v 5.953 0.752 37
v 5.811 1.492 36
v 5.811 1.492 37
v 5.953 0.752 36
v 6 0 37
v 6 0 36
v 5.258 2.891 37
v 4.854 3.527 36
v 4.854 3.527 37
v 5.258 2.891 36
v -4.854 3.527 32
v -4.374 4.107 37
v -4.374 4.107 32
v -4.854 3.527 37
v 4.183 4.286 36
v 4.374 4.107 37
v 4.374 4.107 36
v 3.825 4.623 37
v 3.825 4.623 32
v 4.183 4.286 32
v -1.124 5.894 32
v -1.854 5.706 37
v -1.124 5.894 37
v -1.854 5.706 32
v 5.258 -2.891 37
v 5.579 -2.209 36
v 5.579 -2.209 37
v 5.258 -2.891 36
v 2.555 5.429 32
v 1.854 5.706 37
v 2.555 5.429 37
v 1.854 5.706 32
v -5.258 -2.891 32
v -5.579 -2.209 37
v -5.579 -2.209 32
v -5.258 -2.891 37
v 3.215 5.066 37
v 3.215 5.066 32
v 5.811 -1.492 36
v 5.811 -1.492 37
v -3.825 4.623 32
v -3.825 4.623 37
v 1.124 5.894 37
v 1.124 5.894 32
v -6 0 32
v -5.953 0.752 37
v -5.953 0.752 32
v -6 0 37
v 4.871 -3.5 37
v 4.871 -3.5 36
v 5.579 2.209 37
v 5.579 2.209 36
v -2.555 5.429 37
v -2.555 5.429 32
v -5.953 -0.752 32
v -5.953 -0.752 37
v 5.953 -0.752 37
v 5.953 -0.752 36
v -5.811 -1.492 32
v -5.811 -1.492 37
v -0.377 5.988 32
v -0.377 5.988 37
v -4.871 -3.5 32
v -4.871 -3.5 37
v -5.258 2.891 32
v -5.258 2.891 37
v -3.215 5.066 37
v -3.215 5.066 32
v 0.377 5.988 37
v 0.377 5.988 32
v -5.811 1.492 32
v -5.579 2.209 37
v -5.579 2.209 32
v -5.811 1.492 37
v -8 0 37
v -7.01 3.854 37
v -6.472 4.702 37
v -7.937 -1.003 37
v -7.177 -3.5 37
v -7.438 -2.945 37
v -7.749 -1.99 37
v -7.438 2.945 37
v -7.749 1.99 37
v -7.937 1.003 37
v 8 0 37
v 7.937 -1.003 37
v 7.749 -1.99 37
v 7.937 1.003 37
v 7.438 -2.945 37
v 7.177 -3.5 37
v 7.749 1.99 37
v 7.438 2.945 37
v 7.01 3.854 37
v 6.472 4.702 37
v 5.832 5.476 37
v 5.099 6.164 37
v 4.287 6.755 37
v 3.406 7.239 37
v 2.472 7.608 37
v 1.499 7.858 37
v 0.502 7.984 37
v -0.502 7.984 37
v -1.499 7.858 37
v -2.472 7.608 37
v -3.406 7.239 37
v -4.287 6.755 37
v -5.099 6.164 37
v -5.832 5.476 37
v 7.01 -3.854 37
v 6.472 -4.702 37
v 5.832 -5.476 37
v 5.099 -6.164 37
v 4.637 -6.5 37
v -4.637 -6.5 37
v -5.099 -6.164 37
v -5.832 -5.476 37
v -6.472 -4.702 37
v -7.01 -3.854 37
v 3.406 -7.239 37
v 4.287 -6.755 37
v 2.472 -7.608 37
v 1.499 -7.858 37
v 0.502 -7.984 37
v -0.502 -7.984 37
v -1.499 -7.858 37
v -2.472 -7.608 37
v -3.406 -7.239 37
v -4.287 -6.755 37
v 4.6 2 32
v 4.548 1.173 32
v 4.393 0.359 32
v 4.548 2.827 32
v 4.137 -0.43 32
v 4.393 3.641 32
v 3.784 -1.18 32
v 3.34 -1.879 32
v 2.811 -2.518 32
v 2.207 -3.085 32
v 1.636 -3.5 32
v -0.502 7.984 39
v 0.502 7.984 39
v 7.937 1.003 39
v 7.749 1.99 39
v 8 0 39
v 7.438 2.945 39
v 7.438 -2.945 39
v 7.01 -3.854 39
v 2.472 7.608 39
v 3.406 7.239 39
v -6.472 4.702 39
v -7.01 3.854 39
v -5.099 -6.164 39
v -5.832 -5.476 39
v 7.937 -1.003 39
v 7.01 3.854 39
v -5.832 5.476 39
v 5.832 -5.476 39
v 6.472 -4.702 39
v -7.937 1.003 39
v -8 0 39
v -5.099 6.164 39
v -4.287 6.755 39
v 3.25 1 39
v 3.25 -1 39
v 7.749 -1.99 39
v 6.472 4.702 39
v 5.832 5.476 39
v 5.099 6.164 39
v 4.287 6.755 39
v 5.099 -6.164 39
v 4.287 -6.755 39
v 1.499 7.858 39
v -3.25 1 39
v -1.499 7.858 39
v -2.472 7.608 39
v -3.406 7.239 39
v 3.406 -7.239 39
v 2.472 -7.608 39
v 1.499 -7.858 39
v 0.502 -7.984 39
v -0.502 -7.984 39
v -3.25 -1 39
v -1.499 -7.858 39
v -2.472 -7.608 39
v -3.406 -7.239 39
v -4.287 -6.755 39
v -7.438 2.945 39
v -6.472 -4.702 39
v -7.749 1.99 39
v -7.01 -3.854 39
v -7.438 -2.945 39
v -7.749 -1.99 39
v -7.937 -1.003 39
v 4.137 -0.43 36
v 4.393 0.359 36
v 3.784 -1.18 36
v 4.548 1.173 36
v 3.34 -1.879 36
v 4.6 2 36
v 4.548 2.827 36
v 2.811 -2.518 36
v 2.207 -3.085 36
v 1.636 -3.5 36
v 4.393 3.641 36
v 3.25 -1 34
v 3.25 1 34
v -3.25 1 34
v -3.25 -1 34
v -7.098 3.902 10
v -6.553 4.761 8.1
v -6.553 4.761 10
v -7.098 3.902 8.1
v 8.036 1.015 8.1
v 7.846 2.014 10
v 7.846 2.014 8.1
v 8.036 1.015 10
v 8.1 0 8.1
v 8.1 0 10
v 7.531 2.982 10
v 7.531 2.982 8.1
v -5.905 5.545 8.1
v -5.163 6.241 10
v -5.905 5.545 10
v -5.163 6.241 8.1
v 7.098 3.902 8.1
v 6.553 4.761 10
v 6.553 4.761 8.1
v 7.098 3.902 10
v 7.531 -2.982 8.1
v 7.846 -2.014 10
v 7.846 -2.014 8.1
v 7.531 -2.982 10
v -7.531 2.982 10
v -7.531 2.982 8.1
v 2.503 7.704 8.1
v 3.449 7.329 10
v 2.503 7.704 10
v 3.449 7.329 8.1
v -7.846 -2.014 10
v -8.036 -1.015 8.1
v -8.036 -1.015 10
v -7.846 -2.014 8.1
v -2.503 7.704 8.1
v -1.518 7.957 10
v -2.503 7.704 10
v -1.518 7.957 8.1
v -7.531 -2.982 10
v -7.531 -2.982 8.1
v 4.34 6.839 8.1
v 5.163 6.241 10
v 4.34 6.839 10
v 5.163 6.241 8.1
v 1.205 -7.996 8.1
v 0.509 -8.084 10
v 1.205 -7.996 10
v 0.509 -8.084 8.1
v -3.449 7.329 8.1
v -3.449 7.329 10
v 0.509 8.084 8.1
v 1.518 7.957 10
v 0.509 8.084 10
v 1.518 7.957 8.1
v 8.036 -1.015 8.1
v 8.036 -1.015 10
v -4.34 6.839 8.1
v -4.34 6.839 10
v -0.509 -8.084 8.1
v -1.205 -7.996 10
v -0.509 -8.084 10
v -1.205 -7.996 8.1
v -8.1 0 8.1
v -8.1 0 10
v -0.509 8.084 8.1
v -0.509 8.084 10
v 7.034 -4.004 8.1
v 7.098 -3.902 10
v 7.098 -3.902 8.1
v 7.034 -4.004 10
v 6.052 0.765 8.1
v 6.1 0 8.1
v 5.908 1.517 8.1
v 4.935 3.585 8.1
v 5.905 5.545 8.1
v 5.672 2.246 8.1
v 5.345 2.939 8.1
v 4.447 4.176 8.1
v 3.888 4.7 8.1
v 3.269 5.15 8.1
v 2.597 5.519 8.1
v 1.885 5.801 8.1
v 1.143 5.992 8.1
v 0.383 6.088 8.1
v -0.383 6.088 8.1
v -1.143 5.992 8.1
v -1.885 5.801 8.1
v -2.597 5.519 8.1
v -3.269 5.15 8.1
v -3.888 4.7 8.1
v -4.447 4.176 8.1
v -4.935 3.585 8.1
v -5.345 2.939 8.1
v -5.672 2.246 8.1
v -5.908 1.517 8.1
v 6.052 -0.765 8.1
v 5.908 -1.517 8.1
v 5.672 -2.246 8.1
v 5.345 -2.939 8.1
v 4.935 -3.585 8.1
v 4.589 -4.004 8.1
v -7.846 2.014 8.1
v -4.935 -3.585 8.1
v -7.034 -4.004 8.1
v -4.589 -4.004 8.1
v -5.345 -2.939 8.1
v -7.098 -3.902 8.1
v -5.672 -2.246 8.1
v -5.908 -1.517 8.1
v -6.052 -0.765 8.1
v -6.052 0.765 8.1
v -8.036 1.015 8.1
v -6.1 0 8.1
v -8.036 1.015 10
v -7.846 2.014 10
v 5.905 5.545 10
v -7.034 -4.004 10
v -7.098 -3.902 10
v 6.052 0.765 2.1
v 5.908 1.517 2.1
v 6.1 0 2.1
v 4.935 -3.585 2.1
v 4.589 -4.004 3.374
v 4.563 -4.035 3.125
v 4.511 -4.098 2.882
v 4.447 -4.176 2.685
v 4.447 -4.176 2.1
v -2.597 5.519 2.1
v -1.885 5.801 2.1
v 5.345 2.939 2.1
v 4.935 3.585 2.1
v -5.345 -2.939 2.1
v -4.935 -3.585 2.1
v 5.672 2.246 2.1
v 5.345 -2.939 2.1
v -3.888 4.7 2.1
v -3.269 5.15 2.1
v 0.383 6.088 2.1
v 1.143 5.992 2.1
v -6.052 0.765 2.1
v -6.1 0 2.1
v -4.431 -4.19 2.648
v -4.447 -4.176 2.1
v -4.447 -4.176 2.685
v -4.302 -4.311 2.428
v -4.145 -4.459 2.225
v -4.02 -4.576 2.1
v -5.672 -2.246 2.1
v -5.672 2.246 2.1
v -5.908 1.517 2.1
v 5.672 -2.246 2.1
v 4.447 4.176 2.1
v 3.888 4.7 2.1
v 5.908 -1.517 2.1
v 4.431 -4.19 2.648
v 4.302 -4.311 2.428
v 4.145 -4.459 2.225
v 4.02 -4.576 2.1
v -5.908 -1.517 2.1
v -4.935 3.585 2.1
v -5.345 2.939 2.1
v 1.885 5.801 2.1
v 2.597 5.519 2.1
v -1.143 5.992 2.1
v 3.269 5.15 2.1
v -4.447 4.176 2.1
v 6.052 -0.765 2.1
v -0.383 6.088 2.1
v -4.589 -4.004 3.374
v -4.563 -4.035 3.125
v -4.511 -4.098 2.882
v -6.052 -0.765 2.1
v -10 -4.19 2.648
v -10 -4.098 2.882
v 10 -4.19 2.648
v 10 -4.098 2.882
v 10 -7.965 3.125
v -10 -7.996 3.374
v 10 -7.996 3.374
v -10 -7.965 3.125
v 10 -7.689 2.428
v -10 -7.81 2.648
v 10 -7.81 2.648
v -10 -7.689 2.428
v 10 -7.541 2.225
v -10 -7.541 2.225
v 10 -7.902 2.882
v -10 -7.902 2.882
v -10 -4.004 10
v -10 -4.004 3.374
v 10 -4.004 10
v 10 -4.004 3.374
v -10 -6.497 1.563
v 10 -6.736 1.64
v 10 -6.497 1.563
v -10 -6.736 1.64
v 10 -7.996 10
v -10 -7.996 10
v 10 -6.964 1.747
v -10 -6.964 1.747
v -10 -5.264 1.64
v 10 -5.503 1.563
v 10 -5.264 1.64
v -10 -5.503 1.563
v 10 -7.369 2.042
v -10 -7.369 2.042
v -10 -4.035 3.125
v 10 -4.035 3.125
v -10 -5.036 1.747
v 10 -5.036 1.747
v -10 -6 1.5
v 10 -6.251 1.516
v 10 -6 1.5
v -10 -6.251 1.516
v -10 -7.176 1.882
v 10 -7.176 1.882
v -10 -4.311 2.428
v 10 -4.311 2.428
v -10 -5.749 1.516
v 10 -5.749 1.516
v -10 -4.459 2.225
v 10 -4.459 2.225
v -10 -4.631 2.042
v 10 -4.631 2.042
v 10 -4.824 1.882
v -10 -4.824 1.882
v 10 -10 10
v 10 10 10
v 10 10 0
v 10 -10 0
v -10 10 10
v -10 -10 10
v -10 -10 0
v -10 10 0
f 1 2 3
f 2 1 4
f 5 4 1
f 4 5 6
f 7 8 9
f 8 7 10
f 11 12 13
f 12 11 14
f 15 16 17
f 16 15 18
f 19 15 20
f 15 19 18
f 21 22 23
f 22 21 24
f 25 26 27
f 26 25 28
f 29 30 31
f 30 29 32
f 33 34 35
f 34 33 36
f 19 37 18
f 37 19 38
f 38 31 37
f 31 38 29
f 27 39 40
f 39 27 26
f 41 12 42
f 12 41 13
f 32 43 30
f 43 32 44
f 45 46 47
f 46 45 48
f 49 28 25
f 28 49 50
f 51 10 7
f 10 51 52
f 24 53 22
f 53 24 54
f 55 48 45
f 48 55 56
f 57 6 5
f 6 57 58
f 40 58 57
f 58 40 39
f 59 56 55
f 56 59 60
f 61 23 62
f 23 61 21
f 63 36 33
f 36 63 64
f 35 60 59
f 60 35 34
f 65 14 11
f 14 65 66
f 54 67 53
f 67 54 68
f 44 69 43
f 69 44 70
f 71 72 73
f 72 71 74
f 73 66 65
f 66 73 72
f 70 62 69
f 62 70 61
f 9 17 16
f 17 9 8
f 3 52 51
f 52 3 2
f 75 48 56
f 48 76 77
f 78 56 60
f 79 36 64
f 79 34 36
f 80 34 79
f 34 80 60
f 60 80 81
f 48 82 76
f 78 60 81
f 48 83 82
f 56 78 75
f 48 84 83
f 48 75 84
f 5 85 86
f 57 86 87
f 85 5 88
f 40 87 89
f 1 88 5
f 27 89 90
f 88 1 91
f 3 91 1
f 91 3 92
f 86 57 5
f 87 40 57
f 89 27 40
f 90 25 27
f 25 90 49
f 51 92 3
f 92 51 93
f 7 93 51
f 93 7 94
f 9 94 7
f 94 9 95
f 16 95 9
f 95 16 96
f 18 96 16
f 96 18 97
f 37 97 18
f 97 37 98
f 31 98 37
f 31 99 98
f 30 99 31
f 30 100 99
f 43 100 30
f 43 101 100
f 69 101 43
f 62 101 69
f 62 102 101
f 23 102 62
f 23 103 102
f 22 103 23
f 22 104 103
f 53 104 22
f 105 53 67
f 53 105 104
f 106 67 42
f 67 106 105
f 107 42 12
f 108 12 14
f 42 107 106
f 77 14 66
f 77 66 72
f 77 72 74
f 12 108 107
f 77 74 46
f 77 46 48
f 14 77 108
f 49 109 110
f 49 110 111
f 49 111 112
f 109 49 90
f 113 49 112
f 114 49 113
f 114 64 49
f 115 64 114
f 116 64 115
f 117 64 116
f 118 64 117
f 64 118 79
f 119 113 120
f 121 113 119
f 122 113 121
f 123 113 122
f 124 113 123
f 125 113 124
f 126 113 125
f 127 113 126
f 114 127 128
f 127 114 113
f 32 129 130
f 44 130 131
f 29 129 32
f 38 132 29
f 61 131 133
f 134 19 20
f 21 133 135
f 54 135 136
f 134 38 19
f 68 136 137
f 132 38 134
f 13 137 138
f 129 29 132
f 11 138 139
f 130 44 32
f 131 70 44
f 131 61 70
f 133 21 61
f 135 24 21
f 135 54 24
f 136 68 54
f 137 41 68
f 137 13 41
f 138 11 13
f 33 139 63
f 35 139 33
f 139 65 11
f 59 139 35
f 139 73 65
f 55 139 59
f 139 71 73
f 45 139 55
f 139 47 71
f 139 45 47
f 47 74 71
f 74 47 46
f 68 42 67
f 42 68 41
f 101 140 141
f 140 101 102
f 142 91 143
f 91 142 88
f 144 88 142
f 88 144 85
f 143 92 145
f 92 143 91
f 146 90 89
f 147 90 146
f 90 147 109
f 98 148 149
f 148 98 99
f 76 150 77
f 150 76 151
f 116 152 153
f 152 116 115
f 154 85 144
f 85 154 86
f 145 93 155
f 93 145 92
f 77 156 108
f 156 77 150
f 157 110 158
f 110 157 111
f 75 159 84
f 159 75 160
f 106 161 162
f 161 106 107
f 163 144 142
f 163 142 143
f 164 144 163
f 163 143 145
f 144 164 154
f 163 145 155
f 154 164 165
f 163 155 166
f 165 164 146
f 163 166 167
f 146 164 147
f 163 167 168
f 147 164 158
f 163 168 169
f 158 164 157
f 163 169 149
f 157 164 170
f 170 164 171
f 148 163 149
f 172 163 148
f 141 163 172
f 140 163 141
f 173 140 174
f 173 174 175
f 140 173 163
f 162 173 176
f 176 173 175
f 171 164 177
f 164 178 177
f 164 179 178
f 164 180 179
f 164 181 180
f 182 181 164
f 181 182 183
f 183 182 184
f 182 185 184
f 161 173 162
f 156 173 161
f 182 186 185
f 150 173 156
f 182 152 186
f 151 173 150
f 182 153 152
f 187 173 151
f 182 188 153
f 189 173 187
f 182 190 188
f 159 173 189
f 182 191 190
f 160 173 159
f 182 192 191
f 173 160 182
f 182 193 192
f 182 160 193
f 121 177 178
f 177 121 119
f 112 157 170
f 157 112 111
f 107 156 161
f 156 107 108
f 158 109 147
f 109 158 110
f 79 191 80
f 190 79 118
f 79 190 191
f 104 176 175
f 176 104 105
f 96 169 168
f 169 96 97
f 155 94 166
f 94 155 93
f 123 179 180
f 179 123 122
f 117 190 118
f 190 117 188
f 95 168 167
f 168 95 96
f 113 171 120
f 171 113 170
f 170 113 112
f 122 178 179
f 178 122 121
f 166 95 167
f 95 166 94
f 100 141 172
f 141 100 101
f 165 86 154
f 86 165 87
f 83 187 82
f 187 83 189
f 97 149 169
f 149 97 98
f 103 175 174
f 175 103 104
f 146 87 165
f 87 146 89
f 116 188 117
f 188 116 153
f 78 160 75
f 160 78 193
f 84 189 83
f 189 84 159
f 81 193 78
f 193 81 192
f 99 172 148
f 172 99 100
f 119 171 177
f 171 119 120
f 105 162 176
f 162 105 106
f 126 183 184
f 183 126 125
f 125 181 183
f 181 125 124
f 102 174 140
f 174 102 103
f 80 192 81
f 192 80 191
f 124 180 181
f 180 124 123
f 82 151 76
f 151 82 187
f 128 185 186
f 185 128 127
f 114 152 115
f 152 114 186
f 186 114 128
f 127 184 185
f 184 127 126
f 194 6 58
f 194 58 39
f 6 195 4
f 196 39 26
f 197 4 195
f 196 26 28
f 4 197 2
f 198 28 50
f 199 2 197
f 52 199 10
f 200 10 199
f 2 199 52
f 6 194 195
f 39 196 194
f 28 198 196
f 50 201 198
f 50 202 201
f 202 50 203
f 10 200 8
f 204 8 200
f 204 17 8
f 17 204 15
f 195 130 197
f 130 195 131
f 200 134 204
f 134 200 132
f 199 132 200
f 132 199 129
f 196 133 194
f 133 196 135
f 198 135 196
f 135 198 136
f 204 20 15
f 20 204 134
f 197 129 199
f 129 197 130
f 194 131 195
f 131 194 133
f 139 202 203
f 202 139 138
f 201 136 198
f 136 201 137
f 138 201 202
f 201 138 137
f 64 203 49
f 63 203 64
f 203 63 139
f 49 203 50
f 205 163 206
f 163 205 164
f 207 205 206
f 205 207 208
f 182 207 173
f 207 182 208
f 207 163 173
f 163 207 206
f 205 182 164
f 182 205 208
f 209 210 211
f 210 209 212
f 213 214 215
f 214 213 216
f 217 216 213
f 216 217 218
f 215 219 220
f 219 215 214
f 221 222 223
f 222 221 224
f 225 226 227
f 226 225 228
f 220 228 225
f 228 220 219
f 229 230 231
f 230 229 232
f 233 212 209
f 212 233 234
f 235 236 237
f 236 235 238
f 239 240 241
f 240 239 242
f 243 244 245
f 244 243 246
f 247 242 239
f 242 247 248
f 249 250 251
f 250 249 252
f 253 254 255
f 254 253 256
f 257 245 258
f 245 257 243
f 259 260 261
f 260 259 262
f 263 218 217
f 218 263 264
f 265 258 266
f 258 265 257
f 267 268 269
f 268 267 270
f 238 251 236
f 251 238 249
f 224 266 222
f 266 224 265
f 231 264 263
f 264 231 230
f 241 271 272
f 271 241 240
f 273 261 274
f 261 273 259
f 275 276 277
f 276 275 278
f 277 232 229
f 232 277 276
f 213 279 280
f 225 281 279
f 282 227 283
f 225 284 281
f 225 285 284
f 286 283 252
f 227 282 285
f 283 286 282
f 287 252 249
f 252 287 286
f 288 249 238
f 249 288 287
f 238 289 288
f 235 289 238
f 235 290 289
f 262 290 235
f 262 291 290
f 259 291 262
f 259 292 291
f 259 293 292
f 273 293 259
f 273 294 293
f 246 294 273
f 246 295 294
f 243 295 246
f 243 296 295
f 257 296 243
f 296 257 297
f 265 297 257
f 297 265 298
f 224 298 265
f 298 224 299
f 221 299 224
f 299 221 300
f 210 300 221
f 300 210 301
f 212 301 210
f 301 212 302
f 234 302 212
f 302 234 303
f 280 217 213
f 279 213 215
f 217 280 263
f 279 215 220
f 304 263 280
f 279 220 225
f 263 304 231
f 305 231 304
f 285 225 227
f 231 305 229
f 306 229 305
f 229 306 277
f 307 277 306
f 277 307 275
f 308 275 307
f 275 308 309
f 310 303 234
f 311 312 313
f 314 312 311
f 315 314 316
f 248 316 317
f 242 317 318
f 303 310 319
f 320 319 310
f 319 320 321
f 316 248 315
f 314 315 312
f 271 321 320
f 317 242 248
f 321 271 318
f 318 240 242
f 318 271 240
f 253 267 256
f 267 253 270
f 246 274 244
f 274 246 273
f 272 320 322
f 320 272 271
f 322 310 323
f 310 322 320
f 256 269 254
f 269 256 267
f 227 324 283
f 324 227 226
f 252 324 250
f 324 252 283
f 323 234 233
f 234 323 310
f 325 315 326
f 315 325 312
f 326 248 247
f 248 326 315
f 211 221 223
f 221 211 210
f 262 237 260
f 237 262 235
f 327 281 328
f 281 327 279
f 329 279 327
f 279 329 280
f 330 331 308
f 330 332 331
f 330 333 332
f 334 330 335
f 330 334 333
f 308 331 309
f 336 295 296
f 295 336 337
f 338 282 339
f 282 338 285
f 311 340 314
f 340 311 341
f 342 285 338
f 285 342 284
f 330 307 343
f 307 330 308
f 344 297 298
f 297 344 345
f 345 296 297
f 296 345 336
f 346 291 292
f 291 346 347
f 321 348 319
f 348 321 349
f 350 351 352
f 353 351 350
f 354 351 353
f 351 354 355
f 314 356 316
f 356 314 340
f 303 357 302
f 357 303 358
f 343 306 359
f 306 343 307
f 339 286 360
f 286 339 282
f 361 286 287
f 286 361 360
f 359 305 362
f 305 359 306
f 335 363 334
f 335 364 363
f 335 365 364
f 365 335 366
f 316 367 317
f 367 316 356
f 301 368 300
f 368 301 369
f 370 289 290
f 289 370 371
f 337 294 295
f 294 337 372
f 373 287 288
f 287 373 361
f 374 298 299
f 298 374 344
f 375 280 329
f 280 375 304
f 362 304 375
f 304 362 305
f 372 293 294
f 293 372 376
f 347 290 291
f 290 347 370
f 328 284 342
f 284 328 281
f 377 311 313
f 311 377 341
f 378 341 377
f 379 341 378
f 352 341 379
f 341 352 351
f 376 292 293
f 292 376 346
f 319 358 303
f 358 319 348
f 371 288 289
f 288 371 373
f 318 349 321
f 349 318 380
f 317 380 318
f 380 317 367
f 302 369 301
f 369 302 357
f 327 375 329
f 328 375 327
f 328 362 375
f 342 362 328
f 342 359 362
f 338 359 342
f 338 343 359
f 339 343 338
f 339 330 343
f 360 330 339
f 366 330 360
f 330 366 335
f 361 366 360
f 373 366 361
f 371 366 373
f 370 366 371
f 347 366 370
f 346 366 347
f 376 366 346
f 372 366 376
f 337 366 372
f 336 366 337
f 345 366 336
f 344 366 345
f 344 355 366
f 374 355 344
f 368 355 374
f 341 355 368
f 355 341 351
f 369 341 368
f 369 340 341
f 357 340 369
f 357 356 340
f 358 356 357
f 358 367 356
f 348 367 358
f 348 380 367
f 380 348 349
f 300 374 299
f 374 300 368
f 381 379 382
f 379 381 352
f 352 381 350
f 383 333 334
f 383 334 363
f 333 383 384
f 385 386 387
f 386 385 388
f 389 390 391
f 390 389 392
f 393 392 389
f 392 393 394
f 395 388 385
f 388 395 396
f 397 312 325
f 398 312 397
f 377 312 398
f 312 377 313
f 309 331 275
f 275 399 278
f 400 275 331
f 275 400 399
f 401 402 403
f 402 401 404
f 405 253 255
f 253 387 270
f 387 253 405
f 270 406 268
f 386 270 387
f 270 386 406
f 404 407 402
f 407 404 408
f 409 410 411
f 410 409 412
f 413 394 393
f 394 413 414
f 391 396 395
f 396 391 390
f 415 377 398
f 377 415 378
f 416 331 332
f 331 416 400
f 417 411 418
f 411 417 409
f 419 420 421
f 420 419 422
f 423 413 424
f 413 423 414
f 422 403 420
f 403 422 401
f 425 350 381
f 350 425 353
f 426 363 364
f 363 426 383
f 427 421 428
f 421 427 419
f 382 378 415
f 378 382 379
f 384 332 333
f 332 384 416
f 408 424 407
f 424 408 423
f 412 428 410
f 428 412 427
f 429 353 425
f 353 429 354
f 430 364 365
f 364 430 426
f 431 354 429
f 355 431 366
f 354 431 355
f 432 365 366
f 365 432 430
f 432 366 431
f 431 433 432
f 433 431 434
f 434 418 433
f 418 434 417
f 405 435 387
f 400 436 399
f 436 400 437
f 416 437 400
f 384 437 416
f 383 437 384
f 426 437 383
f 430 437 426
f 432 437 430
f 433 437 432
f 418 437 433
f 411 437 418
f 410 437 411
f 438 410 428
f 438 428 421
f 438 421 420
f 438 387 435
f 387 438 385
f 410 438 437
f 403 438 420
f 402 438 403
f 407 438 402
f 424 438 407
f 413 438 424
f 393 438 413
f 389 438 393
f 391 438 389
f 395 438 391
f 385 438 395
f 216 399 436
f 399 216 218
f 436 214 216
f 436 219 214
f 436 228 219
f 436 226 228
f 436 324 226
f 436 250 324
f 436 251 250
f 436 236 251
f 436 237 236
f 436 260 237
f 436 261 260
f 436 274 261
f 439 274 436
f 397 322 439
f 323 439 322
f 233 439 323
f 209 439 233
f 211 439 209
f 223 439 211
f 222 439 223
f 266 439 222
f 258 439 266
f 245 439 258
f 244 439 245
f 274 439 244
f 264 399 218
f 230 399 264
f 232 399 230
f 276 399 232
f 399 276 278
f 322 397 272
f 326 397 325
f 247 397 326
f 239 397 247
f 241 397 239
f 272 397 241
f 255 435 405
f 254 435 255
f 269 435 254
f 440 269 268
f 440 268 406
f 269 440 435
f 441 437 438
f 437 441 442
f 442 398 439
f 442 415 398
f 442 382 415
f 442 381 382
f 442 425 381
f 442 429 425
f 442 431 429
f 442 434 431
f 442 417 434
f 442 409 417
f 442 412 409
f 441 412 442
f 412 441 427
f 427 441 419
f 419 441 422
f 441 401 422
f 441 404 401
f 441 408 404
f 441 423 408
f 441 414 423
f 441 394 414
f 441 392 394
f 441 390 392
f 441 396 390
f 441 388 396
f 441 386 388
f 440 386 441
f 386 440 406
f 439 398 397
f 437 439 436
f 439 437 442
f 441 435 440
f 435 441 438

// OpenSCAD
Relif_sz=20;
Relif_height=10;

module StrainRelif1(sz=20,part="bottom",spacer=false){
   g=sz/20;
   h=10*g;
   if (part=="bottom"){
      h1=2*g;
      h2=8*g;
      difference(){
         translate([0,0,h/2])
            cube([sz,sz,h],center=true);
         if (!spacer){
            translate([0,0,(h1/2)+8*g+0.1])
               cylinder(r=8*g+0.1,h=h1,center=true,$fn=50);
            translate([0,0,(h2/2)+2*g+0.1])
               cylinder(r=6*g+0.1,h=h2,center=true,$fn=50);
            hull(){
               translate([0,6*g*-1,g*3.5])
                  rotate(a=[0,90,0])
                     cylinder(d=4*g,h=sz*2,center=true,$fn=50);
               translate([0,6*g*-1,g*10])
                  rotate(a=[0,90,0])
                     cylinder(d=4*g,h=sz*2,center=true,$fn=50);
            }
         }
      }
   }
   if (part=="skrew"){
      h1=5*g;
      h2=2*g;
      difference(){
         union(){ 
            translate([0,0,(h1/2)+2*g])
               cylinder(r=6*g,h=h1,center=true,$fn=50);
            translate([0,0,(h2/2)+g*7])
               cylinder(r=8*g,h=h2,center=true,$fn=50);
         }
         translate([0,5*g*-1,(5*g/2)+2*g])
            cube([sz,3*g,5*g],center=true);
         translate([0,0,h/2+3*g+1])
            cube([6.5*g,2*g,h],center=true);
         h4=4*g;
         difference(){
            translate([2*g*-1,2*g,(h4/2)+2*g])
               cylinder(r=20*g,h=h4,center=true,$fn=50);
            translate([2*g*-1,2*g,(h4/2)+2*g])
               cylinder(r=6.6*g,h=h4,center=true,$fn=50);
         }
      }
   }
}

translate([0,0,30])
   StrainRelif1(
      part="skrew",
      sz=Relif_sz
   );
translate([0,0,0])
   StrainRelif1(
      part="bottom",
      sz=Relif_sz
   );
//translate([0,0,-30])
//   StrainRelif1(
//      part="bottom",
//      spacer=true,
//      sz=Relif_sz
//   );
